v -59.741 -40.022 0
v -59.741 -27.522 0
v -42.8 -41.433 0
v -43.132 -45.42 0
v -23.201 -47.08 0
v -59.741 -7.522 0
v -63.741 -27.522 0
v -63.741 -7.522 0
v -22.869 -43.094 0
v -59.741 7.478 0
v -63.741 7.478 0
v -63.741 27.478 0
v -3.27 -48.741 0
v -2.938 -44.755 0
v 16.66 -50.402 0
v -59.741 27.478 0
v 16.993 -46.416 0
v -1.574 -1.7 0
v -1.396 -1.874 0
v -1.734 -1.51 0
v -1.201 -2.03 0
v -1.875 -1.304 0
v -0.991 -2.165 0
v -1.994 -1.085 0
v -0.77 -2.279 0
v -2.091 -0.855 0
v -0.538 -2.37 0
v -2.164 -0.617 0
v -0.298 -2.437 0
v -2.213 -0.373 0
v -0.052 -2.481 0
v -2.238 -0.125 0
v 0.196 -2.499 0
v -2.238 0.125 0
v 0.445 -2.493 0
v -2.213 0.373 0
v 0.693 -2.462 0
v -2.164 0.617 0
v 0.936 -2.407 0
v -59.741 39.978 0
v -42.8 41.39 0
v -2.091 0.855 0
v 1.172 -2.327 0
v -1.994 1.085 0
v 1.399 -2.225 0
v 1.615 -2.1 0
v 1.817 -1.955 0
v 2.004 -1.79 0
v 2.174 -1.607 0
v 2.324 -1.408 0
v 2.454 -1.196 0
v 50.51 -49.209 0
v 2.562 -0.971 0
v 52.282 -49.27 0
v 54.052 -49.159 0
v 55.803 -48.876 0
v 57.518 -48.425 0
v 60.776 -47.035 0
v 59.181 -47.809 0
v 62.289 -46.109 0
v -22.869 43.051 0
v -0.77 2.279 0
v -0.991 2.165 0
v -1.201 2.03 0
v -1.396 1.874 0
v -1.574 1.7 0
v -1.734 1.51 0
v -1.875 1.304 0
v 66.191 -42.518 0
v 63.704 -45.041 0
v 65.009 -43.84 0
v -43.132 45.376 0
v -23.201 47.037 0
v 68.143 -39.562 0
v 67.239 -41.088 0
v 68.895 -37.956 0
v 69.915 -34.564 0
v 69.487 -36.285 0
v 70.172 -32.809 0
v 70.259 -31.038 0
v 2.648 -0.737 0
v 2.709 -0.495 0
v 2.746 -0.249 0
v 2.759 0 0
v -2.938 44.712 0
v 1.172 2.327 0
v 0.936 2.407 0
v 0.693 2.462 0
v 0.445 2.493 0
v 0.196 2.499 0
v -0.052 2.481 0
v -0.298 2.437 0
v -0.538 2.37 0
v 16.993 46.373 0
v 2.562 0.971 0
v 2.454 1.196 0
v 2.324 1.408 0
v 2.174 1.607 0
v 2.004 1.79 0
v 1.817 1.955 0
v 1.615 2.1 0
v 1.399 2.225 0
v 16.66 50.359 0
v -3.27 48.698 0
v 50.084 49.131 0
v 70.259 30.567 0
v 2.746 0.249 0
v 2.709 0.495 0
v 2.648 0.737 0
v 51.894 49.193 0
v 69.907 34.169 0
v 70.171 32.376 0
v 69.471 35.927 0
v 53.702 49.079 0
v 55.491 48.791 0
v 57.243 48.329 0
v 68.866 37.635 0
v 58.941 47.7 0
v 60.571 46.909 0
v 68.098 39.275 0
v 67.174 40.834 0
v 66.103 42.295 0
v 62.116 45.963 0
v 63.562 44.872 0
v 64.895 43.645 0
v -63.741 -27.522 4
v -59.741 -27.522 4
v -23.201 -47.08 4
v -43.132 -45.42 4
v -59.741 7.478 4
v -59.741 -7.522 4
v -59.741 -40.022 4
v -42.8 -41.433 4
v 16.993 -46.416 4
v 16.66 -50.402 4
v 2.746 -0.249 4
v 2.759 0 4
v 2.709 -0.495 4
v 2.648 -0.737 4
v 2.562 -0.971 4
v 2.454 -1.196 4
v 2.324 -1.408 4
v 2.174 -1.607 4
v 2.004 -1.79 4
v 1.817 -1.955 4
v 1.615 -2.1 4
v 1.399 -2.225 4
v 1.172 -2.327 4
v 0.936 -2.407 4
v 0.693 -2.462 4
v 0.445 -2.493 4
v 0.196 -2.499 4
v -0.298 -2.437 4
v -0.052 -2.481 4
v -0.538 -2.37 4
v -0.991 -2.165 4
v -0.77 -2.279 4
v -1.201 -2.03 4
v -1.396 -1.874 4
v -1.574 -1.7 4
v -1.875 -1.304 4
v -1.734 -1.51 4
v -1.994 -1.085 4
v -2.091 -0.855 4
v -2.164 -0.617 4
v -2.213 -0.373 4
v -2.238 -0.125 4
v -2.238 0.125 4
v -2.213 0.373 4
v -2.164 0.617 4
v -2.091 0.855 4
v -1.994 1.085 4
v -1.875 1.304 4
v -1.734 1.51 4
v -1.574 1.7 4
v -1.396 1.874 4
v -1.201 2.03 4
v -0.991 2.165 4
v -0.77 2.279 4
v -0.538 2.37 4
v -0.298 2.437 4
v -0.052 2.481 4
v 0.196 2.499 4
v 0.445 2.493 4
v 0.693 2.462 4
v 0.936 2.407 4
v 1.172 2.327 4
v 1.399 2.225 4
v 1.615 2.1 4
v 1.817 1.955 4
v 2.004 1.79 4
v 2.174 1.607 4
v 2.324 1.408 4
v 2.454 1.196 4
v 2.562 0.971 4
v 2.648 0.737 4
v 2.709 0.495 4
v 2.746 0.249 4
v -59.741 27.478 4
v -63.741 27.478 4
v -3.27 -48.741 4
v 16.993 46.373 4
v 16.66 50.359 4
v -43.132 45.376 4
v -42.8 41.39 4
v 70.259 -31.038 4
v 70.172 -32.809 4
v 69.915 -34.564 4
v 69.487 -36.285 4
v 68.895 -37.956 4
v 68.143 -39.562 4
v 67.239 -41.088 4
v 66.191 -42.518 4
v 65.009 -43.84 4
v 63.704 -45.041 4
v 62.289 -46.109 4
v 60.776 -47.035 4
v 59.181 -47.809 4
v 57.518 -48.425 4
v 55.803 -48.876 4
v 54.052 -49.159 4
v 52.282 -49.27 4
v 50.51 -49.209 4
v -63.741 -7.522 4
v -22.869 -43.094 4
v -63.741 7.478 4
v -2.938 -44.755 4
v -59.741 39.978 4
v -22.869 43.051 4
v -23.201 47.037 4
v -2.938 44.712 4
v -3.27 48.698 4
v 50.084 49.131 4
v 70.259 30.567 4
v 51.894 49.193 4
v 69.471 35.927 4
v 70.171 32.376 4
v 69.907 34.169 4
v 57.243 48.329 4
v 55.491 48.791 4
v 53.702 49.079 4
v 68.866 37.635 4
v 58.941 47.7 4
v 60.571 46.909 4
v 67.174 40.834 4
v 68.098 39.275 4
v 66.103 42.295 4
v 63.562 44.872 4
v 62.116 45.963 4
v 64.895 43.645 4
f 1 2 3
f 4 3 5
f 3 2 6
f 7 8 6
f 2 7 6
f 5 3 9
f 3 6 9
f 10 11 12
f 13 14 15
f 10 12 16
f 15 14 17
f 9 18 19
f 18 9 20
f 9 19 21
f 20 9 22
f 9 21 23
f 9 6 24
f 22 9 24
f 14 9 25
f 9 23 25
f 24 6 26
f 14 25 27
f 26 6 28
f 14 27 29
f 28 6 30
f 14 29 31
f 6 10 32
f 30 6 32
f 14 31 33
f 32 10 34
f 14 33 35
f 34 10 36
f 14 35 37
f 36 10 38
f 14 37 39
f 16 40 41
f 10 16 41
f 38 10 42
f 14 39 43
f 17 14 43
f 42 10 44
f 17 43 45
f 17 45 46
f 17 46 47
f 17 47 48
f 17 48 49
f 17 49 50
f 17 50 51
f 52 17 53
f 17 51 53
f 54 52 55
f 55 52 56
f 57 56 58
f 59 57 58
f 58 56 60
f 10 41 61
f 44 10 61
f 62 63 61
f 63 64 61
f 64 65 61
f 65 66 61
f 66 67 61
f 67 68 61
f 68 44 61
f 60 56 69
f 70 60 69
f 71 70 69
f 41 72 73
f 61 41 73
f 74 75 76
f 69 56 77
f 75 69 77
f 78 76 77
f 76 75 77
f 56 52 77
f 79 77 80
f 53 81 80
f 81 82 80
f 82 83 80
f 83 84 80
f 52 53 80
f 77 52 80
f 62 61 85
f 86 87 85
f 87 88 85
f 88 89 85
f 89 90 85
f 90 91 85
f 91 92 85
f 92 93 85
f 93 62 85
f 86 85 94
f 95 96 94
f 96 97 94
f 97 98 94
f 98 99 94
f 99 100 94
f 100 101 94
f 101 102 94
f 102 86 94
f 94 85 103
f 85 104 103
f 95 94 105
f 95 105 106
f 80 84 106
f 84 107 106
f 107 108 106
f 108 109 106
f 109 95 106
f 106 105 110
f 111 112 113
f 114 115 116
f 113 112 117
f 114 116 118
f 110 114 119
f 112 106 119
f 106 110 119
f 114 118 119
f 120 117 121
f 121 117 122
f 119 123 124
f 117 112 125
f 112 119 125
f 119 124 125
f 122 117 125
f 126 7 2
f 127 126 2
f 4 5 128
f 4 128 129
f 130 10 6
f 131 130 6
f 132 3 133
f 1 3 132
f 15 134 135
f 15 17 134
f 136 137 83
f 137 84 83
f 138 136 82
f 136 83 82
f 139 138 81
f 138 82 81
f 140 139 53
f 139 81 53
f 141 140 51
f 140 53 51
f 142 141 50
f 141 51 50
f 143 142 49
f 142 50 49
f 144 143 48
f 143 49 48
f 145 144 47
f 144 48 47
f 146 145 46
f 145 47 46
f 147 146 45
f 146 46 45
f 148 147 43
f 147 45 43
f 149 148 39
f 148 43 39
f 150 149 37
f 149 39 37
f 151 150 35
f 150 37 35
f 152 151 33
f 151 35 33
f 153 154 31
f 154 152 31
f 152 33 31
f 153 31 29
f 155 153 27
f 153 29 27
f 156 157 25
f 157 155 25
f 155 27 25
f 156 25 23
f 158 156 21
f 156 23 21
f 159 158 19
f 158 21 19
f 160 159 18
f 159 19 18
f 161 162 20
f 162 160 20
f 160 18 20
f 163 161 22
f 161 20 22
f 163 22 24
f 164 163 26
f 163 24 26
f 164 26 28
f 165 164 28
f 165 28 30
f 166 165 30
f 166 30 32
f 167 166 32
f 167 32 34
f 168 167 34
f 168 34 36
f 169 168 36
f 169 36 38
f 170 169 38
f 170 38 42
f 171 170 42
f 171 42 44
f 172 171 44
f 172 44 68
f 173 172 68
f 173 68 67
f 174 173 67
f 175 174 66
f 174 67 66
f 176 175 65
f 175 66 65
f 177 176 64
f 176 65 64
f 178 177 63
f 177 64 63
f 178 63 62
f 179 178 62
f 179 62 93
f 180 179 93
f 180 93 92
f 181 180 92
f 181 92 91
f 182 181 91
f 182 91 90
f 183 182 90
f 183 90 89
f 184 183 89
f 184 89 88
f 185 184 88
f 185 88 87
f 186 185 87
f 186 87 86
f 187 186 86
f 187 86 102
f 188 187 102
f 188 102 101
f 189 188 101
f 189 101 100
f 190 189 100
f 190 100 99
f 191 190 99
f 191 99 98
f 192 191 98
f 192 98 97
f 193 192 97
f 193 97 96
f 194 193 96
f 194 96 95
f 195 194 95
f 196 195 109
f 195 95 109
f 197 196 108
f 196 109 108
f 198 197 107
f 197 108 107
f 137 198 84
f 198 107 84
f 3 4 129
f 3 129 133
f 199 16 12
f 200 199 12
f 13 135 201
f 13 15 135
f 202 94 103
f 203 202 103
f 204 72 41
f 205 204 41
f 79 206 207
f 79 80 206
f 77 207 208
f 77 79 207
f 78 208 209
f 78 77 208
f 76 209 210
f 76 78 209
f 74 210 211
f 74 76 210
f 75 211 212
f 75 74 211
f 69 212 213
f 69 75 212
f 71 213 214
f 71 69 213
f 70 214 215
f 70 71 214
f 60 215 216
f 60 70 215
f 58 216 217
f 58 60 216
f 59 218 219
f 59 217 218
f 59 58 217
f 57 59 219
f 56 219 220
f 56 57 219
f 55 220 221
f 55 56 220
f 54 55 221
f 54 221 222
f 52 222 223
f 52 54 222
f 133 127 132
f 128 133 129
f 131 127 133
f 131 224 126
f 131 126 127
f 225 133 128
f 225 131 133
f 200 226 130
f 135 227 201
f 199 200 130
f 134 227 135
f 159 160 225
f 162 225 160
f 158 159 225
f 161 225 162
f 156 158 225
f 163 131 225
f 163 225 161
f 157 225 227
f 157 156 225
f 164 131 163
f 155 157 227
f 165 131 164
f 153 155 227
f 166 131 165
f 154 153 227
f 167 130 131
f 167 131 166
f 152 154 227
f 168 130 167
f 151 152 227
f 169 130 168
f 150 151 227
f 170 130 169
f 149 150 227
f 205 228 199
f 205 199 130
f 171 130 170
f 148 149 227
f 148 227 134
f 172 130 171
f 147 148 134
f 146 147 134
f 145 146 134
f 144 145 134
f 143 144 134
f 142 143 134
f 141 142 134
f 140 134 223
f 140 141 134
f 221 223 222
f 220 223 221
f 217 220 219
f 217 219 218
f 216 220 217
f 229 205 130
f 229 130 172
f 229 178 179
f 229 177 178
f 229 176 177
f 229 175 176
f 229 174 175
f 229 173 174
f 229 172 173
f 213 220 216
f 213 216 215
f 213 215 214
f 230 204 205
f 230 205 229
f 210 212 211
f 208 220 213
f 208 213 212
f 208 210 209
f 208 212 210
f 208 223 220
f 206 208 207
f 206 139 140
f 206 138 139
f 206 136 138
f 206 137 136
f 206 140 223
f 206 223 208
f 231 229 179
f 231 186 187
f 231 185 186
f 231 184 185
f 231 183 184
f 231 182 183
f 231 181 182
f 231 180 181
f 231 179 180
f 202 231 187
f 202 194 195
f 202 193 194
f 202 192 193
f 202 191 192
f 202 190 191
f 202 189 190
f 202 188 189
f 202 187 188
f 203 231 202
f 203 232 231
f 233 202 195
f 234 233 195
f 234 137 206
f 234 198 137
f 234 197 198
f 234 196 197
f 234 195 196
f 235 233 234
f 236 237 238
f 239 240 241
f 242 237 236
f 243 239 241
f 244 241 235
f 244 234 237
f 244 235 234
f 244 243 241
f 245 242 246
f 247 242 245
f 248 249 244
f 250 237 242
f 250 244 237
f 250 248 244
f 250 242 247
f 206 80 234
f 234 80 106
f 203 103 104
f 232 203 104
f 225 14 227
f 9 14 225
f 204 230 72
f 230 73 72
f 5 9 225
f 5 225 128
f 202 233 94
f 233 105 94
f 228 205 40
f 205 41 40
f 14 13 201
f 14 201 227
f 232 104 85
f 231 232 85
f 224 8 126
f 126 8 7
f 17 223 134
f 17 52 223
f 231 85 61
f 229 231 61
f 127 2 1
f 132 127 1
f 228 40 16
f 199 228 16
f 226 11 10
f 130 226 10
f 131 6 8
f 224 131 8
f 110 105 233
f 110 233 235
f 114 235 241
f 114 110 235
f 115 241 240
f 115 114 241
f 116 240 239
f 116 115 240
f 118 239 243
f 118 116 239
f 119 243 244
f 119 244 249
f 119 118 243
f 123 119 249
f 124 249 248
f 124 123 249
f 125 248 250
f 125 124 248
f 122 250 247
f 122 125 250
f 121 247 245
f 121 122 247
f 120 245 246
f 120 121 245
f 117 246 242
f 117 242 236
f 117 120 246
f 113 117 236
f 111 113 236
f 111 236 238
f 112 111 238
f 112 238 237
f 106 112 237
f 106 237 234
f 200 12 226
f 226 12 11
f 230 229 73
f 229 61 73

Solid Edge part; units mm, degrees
sketch "Sketch1" plane through (0, 0, 0) normal (0, 0, 1) x (1, 0, 0)
  line L0 (50.5102, -49.2092) -> (-59.7414, -40.0215)
  line L1 (-59.7414, 39.9785) -> (-59.7414, -40.0215)
  line L2 (50.0837, 49.1305) -> (-59.7414, 39.9785)
  arc A0 (50.0837, 49.1305) -> (70.2586, 30.5669) centre (51.6306, 30.5669) cw
  line L3 (70.2586, -31.038) -> (70.2586, 30.5669)
  arc A1 (50.5102, -49.2092) -> (70.2586, -31.038) centre (52.0245, -31.038) ccw
  line L4 (16.6604, -50.4022) -> (-3.2705, -48.7413)
  line L5 (-3.2705, -48.7413) -> (-2.9383, -44.7551)
  line L6 (-2.9383, -44.7551) -> (16.9926, -46.4161)
  line L7 (16.9926, -46.4161) -> (16.6604, -50.4022)
  line L8 (-23.2014, -47.0804) -> (-43.1323, -45.4195)
  line L9 (-43.1323, -45.4195) -> (-42.8001, -41.4333)
  line L10 (-42.8001, -41.4333) -> (-22.8692, -43.0942)
  line L11 (-22.8692, -43.0942) -> (-23.2014, -47.0804)
  line L12 (-42.8001, 41.3902) -> (-22.8692, 43.0511)
  line L13 (-22.8692, 43.0511) -> (-23.2014, 47.0373)
  line L14 (-23.2014, 47.0373) -> (-43.1323, 45.3764)
  line L15 (-43.1323, 45.3764) -> (-42.8001, 41.3902)
  line L16 (16.6604, 50.3591) -> (-3.2705, 48.6982)
  line L17 (-3.2705, 48.6982) -> (-2.9383, 44.712)
  line L18 (-2.9383, 44.712) -> (16.9926, 46.373)
  line L19 (16.9926, 46.373) -> (16.6604, 50.3591)
  line L20 (-63.7414, 27.4785) -> (-63.7414, 7.4785)
  line L21 (-63.7414, 7.4785) -> (-59.7414, 7.4785)
  line L22 (-59.7414, 7.4785) -> (-59.7414, 27.4785)
  line L23 (-59.7414, 27.4785) -> (-63.7414, 27.4785)
  line L24 (-59.7414, -27.5215) -> (-59.7414, -7.5215)
  line L25 (-59.7414, -7.5215) -> (-63.7414, -7.5215)
  line L26 (-63.7414, -7.5215) -> (-63.7414, -27.5215)
  line L27 (-63.7414, -27.5215) -> (-59.7414, -27.5215)
  circle A2 centre (0.2586, 0) radius 2.5
  dimension "D1" = 130
  dimension "D2" = 20
  dimension "D3" = 20
  dimension "D4" = 4
  dimension "D5" = 4
  dimension "D6" = 20
  dimension "D7" = 4
  dimension "D8" = 4
  dimension "D9" = 20
  dimension "D10" = 17
  dimension "D11" = 17
  dimension "D12" = 20
  dimension "D13" = 20
  dimension "D14" = 80
  dimension "D15" = 20
  dimension "D16" = 4
  dimension "D17" = 20
  dimension "D18" = 4
  dimension "D19" = 15
  dimension "D20" = 12.5
  dimension "D21" = 12.5
  dimension "D22" = 5
  dimension "D23" = 60
  dimension "D24" = 61.605
extrude "Protrusion1" add sketch "Sketch1" along normal blind 4
